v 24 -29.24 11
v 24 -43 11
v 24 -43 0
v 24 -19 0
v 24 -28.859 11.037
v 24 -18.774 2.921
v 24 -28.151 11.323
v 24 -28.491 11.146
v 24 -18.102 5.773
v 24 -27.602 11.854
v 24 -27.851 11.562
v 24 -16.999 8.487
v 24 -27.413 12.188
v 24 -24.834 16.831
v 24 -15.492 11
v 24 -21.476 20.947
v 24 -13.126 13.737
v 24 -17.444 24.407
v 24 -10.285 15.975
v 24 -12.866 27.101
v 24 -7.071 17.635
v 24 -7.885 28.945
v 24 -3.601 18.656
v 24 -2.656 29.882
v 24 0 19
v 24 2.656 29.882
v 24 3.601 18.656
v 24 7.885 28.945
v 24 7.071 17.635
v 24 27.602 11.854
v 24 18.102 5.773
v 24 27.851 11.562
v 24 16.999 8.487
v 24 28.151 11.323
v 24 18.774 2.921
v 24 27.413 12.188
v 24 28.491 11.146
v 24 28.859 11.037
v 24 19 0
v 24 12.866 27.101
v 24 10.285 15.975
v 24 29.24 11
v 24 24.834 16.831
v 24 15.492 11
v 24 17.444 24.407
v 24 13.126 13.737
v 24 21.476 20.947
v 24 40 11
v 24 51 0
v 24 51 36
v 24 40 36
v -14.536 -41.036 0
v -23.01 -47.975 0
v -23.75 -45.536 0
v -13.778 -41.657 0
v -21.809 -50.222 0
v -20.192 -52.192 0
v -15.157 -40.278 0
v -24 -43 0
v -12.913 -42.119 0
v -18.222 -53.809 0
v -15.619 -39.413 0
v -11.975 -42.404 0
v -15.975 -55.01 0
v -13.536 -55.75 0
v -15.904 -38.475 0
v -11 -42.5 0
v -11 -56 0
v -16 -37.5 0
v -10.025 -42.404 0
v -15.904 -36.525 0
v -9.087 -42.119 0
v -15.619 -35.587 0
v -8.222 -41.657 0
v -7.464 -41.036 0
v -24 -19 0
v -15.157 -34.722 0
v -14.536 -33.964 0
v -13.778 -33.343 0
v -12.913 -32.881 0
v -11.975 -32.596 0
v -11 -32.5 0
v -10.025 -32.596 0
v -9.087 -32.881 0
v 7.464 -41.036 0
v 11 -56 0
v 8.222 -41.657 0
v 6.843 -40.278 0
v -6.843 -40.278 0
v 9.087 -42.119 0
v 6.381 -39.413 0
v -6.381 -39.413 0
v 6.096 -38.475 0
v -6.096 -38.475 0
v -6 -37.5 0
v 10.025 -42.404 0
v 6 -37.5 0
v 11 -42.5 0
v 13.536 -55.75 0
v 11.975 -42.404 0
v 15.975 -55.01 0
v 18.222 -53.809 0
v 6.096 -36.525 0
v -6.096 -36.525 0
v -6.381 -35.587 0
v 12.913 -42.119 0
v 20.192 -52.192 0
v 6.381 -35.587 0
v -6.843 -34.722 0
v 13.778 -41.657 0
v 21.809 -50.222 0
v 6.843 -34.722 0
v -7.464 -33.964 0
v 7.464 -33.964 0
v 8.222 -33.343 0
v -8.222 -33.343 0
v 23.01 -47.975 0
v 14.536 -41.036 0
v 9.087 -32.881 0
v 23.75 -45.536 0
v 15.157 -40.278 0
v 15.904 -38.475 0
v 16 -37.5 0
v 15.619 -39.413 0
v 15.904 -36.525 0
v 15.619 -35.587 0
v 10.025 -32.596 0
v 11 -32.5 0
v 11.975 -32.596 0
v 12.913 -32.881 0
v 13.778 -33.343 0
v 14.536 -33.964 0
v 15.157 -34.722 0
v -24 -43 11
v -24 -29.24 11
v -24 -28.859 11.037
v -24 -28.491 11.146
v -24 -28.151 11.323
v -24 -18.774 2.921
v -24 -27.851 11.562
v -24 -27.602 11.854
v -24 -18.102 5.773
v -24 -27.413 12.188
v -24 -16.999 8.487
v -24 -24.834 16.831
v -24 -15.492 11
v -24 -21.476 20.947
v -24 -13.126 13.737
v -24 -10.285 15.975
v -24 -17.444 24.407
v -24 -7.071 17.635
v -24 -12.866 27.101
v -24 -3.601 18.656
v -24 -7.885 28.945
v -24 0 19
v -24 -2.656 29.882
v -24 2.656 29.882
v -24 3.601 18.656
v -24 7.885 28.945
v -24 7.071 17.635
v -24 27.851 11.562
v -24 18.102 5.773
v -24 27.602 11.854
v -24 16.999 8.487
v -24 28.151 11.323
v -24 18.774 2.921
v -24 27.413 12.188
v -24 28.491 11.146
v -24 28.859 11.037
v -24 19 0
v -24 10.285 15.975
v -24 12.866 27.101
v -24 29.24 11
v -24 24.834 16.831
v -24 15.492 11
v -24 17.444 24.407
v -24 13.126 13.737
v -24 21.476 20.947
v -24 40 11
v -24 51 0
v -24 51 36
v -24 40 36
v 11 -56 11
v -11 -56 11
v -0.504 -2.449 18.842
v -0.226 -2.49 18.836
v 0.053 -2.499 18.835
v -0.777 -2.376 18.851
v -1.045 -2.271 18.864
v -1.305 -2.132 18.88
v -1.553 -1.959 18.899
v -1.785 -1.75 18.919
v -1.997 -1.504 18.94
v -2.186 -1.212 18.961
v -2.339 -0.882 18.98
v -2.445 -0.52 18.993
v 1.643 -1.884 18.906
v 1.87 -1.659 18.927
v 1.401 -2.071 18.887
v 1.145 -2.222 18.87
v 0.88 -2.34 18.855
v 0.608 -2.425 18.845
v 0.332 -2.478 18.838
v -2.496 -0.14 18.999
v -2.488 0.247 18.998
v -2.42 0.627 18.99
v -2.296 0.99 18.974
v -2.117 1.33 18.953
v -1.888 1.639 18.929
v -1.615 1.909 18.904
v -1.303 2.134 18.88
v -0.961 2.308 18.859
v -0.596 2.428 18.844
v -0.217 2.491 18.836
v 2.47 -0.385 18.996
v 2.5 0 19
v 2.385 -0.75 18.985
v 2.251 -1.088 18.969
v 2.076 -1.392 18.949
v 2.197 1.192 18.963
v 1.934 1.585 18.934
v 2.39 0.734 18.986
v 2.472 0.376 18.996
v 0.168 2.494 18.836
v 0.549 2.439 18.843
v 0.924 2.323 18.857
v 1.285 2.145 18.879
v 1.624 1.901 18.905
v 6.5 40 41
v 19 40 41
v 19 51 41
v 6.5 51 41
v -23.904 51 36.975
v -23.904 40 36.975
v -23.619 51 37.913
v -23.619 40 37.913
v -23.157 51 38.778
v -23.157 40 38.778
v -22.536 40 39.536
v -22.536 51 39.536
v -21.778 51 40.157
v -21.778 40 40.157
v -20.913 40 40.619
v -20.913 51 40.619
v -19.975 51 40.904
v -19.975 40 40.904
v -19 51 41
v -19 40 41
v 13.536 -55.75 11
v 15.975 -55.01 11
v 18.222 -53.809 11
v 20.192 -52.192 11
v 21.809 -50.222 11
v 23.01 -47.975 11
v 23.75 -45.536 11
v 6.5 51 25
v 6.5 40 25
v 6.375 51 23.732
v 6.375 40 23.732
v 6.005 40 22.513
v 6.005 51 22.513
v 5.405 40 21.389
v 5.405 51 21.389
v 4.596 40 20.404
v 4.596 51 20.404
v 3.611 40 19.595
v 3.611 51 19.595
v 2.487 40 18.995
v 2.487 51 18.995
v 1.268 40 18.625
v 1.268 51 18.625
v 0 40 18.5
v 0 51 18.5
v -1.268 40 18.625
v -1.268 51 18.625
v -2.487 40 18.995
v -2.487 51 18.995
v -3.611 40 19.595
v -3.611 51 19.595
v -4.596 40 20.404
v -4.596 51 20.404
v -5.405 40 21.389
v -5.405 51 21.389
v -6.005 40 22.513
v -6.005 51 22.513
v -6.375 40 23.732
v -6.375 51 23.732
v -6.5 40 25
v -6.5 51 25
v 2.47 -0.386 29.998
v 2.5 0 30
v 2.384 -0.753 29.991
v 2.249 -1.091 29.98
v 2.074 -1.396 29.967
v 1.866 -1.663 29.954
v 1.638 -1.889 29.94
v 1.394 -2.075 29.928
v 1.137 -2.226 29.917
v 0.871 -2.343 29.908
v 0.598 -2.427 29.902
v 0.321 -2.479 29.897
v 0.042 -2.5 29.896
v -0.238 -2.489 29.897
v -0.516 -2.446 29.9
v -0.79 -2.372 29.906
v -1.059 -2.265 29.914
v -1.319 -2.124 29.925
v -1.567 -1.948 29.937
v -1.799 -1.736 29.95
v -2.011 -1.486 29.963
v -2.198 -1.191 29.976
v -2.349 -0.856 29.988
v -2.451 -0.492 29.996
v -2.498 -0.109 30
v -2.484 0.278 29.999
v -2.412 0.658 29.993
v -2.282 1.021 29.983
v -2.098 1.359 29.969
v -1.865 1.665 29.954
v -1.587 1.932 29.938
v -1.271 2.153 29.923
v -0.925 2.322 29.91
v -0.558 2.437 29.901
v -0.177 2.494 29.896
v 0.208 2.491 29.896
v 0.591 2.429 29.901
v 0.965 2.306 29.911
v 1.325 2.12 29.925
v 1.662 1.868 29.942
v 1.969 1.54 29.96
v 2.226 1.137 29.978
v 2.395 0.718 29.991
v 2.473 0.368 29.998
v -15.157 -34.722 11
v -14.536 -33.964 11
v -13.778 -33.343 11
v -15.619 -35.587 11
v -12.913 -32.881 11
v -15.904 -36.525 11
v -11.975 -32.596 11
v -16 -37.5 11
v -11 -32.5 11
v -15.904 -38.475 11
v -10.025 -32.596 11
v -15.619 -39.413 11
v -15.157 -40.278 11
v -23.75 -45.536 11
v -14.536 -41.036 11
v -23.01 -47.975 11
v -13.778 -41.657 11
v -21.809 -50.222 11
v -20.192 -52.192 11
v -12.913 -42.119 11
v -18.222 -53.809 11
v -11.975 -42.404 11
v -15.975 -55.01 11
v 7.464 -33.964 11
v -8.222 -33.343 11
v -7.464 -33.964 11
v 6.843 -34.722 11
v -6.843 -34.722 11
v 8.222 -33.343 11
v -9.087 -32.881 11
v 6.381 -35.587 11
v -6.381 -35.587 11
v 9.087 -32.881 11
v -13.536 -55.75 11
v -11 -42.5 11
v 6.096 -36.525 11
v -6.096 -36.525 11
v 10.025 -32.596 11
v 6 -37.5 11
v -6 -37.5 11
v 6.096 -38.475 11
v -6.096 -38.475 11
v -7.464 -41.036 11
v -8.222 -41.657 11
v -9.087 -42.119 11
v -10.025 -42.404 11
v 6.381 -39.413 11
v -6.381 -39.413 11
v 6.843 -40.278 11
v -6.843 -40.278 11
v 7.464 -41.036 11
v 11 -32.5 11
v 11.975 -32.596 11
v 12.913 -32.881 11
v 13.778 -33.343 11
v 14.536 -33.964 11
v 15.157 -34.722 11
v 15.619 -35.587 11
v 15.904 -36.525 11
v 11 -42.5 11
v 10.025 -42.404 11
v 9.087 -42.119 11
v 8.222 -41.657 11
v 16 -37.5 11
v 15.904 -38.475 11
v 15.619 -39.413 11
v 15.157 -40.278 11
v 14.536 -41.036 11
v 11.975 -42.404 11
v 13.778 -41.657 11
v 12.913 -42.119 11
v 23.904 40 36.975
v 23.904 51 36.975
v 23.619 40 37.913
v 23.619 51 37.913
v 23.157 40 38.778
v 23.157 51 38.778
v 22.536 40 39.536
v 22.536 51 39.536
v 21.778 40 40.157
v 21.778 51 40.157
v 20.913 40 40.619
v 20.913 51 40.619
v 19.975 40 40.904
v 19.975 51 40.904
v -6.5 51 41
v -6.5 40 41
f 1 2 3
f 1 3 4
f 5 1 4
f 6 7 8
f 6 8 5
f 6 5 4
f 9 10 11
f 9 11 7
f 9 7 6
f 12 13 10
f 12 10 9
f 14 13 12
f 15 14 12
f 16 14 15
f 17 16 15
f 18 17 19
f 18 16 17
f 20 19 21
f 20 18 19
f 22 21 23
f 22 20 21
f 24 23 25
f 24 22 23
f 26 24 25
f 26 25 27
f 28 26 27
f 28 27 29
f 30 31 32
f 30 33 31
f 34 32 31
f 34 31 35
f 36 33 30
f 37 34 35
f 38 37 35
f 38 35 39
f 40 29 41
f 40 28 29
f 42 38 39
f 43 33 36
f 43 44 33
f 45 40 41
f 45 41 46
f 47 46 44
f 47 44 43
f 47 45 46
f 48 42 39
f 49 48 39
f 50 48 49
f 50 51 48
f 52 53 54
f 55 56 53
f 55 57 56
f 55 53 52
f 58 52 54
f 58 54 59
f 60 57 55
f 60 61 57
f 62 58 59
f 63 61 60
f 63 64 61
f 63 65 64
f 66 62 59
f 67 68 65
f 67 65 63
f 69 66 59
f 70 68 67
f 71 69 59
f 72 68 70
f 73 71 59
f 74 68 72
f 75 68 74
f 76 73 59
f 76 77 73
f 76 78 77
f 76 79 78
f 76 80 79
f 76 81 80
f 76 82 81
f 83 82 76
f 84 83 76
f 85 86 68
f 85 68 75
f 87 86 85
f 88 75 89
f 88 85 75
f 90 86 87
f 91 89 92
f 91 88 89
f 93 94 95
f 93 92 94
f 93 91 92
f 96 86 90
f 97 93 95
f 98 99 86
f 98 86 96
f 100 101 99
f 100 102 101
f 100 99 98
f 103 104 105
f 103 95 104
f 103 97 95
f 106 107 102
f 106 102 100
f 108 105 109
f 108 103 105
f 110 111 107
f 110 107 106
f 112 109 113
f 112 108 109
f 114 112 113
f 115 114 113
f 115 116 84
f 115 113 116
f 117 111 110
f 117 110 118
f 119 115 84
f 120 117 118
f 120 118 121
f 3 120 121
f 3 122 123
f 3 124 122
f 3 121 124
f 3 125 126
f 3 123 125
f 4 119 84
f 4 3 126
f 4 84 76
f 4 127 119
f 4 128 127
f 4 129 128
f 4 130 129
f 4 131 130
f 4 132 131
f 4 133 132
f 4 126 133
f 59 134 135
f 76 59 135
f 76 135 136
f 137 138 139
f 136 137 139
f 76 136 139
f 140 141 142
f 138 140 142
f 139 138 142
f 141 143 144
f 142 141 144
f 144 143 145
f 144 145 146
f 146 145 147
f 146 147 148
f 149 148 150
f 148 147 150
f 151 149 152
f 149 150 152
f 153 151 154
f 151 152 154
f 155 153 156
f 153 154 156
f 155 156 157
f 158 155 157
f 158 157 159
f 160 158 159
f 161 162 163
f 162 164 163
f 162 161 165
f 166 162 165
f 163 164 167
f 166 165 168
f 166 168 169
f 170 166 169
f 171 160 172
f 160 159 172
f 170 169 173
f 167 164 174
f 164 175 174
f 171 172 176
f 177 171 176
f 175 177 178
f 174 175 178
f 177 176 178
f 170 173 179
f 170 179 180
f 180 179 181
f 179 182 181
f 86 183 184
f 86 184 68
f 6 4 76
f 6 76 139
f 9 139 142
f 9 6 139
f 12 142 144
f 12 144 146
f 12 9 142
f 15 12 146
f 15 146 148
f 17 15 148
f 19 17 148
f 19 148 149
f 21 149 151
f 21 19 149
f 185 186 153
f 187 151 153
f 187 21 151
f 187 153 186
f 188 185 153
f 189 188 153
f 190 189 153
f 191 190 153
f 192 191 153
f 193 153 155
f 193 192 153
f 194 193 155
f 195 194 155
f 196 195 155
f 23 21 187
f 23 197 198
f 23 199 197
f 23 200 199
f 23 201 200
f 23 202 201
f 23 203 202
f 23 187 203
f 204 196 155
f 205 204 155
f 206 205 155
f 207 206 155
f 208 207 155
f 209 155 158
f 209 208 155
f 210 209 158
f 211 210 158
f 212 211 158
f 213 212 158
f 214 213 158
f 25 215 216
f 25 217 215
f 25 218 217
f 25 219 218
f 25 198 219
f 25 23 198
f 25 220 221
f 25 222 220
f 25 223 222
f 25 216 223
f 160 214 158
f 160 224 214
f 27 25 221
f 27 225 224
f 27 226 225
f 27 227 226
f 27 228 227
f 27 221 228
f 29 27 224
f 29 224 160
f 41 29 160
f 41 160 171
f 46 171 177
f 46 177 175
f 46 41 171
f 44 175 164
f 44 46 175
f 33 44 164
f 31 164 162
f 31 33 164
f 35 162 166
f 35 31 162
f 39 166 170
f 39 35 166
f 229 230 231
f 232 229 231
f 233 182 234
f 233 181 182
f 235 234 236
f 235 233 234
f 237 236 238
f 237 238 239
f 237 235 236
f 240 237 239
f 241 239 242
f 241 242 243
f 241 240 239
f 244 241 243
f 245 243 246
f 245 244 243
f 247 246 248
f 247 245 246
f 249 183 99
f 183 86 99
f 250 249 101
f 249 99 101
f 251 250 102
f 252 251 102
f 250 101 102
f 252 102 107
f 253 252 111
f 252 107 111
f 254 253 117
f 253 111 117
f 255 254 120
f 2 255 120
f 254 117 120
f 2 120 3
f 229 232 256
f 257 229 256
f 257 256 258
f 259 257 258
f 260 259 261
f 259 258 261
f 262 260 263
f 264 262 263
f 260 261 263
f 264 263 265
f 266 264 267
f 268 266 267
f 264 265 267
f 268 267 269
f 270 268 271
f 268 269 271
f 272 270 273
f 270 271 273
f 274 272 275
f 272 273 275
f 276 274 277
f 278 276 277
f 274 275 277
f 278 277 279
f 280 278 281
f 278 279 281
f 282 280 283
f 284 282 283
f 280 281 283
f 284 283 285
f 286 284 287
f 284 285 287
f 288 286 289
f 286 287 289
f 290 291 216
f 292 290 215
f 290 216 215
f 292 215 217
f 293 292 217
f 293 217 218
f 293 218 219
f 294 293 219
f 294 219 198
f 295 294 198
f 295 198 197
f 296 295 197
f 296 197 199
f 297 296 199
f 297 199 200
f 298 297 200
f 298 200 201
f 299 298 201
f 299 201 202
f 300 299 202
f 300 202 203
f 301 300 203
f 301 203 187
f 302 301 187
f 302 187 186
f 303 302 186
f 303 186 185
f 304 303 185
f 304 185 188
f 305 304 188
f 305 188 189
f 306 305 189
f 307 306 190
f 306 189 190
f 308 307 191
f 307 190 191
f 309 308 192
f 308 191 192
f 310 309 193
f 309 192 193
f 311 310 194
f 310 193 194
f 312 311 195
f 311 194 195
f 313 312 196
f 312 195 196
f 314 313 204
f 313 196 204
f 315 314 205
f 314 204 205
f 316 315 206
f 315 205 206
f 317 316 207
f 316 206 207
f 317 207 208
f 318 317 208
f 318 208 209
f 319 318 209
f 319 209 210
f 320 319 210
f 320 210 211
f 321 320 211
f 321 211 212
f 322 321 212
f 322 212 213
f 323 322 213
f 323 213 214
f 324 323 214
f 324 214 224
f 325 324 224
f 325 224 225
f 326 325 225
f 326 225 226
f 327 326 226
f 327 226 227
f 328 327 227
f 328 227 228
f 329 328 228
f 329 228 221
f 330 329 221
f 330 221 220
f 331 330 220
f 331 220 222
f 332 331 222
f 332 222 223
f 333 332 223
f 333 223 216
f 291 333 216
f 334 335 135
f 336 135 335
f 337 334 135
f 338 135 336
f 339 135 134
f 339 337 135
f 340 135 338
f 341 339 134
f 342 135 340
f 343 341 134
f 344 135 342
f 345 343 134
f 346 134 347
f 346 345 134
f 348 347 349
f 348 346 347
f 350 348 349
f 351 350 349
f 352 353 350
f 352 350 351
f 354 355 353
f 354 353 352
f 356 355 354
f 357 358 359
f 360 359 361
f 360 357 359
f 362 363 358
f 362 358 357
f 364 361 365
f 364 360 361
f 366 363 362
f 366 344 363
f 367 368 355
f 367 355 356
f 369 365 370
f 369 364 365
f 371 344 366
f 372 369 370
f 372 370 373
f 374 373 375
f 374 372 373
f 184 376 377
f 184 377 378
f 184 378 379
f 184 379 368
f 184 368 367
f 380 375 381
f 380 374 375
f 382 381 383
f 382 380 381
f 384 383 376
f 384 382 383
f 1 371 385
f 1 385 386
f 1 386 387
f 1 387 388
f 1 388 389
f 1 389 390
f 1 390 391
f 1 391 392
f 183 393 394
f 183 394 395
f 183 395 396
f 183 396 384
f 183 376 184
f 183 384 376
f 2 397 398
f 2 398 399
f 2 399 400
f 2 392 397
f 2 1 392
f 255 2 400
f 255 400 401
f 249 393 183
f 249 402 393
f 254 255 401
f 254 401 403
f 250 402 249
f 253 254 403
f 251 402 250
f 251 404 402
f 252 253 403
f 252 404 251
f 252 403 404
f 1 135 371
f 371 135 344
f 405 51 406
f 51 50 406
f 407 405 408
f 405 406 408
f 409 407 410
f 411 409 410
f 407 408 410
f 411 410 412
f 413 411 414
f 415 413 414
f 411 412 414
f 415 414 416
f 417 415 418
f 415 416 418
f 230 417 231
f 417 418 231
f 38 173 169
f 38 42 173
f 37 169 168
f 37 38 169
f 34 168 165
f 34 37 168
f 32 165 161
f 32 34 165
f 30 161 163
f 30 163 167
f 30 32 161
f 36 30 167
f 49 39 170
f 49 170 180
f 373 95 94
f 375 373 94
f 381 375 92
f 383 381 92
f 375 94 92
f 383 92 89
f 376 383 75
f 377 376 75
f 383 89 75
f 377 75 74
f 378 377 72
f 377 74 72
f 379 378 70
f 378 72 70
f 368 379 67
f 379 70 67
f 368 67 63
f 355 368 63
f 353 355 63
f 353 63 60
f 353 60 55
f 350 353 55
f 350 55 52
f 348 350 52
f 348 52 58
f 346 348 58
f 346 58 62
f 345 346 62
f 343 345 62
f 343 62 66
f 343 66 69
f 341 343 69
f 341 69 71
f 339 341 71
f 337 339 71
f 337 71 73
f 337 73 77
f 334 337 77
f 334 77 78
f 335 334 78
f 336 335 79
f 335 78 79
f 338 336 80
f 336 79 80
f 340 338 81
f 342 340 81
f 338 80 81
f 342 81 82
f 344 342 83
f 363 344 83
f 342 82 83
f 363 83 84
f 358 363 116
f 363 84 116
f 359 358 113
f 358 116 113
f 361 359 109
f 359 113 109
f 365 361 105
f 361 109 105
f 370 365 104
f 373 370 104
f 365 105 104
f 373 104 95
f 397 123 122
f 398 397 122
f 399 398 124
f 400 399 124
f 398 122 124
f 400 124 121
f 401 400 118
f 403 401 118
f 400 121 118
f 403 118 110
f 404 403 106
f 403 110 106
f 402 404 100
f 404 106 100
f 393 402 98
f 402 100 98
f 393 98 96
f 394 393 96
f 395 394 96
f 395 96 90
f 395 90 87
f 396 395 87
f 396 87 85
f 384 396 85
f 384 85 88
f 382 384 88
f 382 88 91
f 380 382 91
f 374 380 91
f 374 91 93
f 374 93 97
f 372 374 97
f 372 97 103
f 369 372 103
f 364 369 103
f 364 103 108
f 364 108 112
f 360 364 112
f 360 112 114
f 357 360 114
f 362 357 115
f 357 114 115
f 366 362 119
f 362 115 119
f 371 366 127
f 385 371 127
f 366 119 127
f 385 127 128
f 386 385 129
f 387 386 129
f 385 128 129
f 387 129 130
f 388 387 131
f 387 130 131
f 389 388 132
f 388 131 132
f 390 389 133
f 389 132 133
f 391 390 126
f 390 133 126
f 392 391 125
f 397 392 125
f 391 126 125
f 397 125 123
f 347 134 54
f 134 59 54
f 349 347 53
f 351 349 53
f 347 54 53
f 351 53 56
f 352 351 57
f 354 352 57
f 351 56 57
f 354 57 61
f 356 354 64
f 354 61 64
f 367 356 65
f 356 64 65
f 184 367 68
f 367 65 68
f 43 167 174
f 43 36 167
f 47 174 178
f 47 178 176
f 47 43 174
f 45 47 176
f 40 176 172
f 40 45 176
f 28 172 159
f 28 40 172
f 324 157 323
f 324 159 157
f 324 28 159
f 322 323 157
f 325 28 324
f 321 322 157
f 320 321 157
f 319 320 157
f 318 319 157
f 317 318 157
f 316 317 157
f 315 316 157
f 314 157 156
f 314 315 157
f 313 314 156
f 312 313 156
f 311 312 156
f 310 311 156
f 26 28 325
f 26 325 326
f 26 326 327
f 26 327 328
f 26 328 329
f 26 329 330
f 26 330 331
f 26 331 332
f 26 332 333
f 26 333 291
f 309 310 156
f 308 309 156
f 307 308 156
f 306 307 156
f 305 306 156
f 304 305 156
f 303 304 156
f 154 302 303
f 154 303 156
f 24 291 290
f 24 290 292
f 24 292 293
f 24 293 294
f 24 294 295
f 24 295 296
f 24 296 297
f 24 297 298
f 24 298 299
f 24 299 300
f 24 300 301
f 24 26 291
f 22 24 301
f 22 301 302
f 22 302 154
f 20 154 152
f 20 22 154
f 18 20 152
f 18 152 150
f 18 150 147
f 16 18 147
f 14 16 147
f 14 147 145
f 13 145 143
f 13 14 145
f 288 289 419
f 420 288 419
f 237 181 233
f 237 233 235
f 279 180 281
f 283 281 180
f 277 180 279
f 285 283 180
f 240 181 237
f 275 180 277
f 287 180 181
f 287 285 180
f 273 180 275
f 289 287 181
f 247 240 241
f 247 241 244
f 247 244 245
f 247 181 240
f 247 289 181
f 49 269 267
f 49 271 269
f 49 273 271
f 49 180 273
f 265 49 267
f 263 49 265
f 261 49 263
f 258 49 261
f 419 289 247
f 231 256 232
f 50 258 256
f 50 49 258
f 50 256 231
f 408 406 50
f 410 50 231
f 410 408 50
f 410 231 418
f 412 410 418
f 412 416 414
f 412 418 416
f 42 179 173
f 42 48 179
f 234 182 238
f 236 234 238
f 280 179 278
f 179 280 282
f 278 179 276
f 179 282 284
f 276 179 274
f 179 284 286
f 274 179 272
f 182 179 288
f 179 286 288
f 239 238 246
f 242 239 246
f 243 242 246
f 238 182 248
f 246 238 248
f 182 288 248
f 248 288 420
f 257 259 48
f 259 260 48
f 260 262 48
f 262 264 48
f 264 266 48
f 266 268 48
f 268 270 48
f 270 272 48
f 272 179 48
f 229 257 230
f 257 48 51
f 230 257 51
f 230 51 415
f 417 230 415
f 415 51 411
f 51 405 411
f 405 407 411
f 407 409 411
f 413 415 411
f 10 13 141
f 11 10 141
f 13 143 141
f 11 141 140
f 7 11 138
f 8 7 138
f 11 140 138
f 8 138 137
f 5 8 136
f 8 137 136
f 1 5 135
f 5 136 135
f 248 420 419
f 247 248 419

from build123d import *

# Parameters (mm, degrees)
F0_W     = 11
F0_H     = 30
F1_DEPTH = 24
F3_DEPTH = 11
F4_R     = 5
F4_R_2   = 2.5
F5_DEPTH = 41.001
F6_R     = 13
F7_R     = 5
F8_R     = 2


with BuildPart() as f1:
    # F0 (on Right) → F1 (new body, symmetric)
    with BuildSketch(Plane.YZ):
        with BuildLine():
            Line((-56, 0), (-30, 0))
            ThreePointArc((-30, 0), (-29.4730143031, 5.5983415304), (-27.9105714739, 11))
            Line((-27.9105714739, 11), (-56, 11))
            Line((-56, 11), (-56, 0))
        make_face()
        with BuildLine():
            Line((-30, 0), (-19, 0))
            ThreePointArc((-19, 0), (-18.1017503893, 5.7729223833), (-15.4919333848, 11))
            Line((-15.4919333848, 11), (-27.9105714739, 11))
            ThreePointArc((-27.9105714739, 11), (-29.4730143031, 5.5983415304), (-30, 0))
        make_face()
        with BuildLine():
            ThreePointArc((15.4919333848, 11), (18.1017503893, 5.7729223833), (19, 0))
            Line((19, 0), (30, 0))
            ThreePointArc((30, 0), (29.4730143031, 5.5983415304), (27.9105714739, 11))
            Line((27.9105714739, 11), (15.4919333848, 11))
        make_face()
        with BuildLine():
            ThreePointArc((-15.4919333848, 11), (0, 19), (15.4919333848, 11))
            Line((15.4919333848, 11), (27.9105714739, 11))
            ThreePointArc((27.9105714739, 11), (0, 30), (-27.9105714739, 11))
            Line((-27.9105714739, 11), (-15.4919333848, 11))
        make_face()
        with BuildLine():
            ThreePointArc((27.9105714739, 11), (29.4730143031, 5.5983415304), (30, 0))
            Line((30, 0), (51, 0))
            Line((51, 0), (51, 11))
            Line((51, 11), (40, 11))
            Line((40, 11), (27.9105714739, 11))
        make_face()
        with Locations((45.5, 26)):
            Rectangle(F0_W, F0_H)
    extrude(amount=F1_DEPTH, both=True)

    # F2 (on face) → F3 (cut, through all)
    with BuildSketch(Plane(origin=(0, 51, 0), x_dir=(-1, 0, 0), z_dir=(0, 1, 0))):
        with BuildLine():
            ThreePointArc((-6.5, 25), (0, 31.5), (6.5, 25))
            Line((6.5, 25), (6.5, 41))
            Line((6.5, 41), (-6.5, 41))
            Line((-6.5, 41), (-6.5, 25))
        make_face()
        with BuildLine():
            ThreePointArc((-6.5, 25), (0, 18.5), (6.5, 25))
            ThreePointArc((6.5, 25), (0, 31.5), (-6.5, 25))
        make_face()
    extrude(amount=-F3_DEPTH, mode=Mode.SUBTRACT)

    # F4 (on face) → F5 (cut, through all)
    with BuildSketch(Plane(origin=(0, 0, 0), x_dir=(1, 0, 0), z_dir=(0, 0, -1))):
        with Locations((11, 37.5)):
            Circle(F4_R)
        Circle(F4_R_2)
        with Locations((-11, 37.5)):
            Circle(F4_R)
    extrude(amount=-F5_DEPTH, mode=Mode.SUBTRACT)

    # F6
    f6_edges = [f1.edges().sort_by_distance(p)[0] for p in [
        (-24, -56, 5.5),
        (24, -56, 5.5),
    ]]
    fillet(f6_edges, radius=F6_R)

    # F7
    f7_edges = [f1.edges().sort_by_distance(p)[0] for p in [
        (-24, 45.5, 41),
        (24, 45.5, 41),
    ]]
    fillet(f7_edges, radius=F7_R)

    # F8
    f8_edges = [f1.edges().sort_by_distance(p)[0] for p in [
        (0, -27.910571, 11),
        (0, 27.910571, 11),
    ]]
    fillet(f8_edges, radius=F8_R)


solid = f1.part
